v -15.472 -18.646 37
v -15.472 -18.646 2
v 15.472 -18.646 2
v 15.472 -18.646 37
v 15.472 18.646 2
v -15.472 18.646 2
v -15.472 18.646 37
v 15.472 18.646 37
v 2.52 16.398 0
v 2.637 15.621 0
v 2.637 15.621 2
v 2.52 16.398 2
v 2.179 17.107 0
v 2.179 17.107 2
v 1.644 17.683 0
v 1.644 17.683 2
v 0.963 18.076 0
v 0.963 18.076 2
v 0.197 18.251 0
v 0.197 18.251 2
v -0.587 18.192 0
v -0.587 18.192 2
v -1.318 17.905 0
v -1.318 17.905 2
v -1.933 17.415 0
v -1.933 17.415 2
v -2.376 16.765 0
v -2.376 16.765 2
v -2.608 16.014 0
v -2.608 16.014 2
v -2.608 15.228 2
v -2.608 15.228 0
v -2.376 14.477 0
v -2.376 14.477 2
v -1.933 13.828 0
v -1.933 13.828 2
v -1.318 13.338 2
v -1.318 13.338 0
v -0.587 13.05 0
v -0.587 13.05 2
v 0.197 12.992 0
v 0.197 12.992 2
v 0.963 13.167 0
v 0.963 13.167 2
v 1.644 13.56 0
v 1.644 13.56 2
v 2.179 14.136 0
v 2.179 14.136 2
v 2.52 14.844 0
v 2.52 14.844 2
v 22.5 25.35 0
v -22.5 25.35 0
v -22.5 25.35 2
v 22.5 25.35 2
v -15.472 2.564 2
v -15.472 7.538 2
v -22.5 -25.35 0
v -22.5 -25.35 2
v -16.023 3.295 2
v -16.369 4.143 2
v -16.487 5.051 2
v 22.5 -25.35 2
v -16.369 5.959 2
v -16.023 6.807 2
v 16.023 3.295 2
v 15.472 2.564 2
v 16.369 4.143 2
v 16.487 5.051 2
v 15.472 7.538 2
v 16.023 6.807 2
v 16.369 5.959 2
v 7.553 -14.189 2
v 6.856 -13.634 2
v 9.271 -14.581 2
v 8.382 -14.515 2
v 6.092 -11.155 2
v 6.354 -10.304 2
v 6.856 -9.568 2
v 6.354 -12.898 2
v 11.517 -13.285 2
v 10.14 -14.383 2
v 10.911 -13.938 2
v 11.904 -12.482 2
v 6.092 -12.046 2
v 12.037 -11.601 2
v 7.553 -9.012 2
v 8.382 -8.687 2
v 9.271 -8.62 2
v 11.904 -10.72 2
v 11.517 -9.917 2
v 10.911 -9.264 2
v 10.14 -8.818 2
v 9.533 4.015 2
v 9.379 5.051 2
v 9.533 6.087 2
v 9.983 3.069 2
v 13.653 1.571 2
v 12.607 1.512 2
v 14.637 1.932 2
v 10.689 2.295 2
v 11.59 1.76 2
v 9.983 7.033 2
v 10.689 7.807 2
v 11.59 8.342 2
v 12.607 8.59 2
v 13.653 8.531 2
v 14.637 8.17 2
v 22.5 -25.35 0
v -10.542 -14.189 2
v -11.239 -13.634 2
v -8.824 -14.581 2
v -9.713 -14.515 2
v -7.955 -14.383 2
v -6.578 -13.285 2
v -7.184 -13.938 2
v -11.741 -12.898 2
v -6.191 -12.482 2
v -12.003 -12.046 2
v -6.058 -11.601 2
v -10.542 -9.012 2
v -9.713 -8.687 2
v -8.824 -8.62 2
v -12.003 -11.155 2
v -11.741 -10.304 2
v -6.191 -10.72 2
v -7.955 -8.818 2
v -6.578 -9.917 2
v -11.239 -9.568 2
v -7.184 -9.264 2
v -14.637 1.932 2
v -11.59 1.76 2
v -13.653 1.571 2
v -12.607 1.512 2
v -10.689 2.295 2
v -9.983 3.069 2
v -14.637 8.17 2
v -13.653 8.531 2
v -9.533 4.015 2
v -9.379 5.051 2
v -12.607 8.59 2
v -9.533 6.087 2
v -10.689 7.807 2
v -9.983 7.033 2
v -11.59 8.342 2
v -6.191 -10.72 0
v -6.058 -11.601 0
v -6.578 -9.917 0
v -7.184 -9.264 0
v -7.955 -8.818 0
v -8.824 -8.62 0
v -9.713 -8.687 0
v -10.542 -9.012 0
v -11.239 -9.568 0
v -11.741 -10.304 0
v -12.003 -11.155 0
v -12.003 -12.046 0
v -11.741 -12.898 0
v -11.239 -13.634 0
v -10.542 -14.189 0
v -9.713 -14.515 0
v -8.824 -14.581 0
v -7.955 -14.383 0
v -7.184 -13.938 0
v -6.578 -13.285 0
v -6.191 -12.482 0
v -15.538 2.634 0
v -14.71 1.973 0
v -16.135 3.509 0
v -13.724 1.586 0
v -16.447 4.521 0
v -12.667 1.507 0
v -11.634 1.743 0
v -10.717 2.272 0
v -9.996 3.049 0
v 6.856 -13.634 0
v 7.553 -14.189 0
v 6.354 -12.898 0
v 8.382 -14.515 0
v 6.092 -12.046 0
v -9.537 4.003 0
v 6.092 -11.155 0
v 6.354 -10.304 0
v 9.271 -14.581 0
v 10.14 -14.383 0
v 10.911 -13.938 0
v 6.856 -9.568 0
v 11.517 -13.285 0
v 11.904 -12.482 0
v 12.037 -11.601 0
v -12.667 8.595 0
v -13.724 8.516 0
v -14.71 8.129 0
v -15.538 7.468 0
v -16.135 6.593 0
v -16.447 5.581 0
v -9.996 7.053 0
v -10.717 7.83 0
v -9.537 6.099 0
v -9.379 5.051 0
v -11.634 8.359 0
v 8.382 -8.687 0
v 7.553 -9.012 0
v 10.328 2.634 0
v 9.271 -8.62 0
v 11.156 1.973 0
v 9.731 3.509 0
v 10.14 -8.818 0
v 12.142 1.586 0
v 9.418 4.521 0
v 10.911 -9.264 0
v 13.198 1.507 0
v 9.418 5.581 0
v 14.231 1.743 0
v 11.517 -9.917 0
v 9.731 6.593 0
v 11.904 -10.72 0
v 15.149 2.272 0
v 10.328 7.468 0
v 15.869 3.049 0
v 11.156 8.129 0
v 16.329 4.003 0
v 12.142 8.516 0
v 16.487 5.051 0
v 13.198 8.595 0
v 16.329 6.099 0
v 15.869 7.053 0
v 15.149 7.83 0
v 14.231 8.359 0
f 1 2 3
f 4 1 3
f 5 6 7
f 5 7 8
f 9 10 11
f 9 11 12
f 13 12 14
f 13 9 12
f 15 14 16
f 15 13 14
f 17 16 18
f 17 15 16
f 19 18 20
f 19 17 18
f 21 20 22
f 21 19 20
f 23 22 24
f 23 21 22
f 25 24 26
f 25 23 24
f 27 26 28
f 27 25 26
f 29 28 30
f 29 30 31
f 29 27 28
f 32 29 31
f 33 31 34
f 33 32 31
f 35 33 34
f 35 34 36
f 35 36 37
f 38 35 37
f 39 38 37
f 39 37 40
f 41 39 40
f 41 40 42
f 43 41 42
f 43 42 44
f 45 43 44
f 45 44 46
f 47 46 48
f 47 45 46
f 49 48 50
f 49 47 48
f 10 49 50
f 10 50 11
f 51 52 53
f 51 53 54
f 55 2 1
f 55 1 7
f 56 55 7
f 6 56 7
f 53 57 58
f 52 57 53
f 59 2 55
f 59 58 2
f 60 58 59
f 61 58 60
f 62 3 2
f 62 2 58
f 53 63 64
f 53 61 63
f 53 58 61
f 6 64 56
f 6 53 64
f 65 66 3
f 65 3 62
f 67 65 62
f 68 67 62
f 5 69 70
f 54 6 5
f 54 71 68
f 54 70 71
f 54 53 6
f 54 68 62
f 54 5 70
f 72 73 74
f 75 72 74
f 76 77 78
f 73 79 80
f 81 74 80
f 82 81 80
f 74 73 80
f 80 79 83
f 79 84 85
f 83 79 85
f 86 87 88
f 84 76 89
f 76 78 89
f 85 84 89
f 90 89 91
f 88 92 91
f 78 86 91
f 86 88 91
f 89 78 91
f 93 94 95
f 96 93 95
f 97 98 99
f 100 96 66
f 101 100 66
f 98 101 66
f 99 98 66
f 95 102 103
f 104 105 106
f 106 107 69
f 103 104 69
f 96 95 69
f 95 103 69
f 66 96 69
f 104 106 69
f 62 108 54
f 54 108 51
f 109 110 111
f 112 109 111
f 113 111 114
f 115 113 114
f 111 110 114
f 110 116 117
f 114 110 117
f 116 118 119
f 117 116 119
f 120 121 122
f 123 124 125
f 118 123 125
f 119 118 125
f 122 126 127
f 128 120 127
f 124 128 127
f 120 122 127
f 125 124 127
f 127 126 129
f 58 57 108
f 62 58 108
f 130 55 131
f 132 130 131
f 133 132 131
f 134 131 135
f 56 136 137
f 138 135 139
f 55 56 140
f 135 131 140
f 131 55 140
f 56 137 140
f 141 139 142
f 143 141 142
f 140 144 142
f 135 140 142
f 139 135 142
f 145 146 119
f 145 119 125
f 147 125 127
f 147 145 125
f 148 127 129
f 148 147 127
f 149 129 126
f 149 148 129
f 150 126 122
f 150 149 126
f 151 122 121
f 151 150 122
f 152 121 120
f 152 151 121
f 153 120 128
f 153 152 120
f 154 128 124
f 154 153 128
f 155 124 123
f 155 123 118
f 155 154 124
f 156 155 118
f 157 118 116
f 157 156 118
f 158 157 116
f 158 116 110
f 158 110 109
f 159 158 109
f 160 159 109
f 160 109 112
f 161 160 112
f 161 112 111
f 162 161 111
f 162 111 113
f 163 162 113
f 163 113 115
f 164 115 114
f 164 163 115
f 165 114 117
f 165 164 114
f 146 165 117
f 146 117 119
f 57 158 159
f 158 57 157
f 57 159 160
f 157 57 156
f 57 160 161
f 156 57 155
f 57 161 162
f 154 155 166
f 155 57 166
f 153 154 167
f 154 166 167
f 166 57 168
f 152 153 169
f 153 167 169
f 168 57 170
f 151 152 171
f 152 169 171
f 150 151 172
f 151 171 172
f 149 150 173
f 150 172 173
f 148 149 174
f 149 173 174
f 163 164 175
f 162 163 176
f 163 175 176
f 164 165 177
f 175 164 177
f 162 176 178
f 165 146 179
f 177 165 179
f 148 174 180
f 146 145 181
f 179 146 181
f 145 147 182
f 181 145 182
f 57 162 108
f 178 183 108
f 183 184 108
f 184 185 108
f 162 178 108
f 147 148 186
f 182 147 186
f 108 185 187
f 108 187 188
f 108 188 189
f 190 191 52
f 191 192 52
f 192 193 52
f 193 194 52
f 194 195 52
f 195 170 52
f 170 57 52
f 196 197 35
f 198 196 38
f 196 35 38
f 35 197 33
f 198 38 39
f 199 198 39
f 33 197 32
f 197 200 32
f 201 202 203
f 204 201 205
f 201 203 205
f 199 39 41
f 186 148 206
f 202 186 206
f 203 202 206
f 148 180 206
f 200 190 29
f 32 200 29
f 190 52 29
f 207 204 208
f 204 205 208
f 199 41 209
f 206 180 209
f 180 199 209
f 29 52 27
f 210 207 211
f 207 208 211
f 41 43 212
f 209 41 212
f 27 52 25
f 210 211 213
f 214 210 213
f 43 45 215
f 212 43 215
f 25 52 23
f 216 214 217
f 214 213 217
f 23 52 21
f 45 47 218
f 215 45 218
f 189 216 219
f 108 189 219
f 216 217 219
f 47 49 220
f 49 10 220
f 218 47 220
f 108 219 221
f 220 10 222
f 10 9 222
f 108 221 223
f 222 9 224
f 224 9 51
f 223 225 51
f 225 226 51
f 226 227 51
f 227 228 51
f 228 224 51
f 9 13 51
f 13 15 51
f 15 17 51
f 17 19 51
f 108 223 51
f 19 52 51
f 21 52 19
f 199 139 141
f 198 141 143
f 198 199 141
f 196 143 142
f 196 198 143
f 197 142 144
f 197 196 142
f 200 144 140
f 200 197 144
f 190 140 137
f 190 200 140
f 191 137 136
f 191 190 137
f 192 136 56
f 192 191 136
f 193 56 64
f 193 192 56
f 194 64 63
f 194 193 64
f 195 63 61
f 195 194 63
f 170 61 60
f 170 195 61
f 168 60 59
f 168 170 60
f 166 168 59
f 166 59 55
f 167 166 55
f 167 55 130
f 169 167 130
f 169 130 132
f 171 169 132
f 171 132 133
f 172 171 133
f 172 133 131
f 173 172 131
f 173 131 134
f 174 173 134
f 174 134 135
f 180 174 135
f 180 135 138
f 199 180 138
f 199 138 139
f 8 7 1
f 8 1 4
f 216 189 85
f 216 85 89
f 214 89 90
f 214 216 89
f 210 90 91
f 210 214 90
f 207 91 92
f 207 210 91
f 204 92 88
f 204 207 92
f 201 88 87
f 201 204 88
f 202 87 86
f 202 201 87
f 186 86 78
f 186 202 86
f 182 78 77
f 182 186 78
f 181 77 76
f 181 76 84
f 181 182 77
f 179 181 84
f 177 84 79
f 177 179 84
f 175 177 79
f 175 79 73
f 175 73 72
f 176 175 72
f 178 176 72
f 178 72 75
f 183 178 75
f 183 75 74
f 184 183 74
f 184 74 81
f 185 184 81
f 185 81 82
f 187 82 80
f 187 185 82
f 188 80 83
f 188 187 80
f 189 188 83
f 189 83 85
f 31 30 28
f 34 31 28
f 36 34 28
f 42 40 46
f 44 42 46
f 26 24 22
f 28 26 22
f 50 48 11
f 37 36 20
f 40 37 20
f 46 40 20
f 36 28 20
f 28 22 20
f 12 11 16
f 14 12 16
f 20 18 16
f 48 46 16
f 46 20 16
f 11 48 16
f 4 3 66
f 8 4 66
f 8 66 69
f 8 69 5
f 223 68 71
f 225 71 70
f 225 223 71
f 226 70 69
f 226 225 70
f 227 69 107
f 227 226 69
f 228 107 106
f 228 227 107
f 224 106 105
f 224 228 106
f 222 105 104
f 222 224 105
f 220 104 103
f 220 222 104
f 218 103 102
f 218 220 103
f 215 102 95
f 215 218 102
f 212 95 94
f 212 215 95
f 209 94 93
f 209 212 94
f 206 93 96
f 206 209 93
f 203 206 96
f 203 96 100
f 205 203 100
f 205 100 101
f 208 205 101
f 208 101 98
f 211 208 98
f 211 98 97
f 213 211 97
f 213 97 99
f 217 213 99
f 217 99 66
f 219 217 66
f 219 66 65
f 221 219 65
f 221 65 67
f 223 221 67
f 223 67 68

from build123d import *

# Parameters (mm, degrees)
SKETCH1_W           = 45
SKETCH1_H           = 50.7
SKETCH1_R           = 2.636973336
SKETCH1_R_2         = 3.554118364
SKETCH1_R_3         = 2.989089767
BOSS_EXTRUDE1_DEPTH = 2
SKETCH2_W           = 30.94366189
SKETCH2_H           = 37.292040818
BOSS_EXTRUDE2_DEPTH = 35


with BuildPart() as part:
    # Sketch1 → Boss-Extrude1 (new body)
    with BuildSketch(Plane.XY):
        Rectangle(SKETCH1_W, SKETCH1_H)
        with Locations((0, 15.621214427)):
            Circle(SKETCH1_R, mode=Mode.SUBTRACT)
        with Locations((-12.932898819, 5.05104632)):
            Circle(SKETCH1_R_2, mode=Mode.SUBTRACT)
        with Locations((-9.047478573, -11.600754735)):
            Circle(SKETCH1_R_3, mode=Mode.SUBTRACT)
        with Locations((9.047478573, -11.600754735)):
            Circle(SKETCH1_R_3, mode=Mode.SUBTRACT)
        with Locations((12.932898819, 5.05104632)):
            Circle(SKETCH1_R_2, mode=Mode.SUBTRACT)
    extrude(amount=BOSS_EXTRUDE1_DEPTH)

    # Sketch2 → Boss-Extrude2 (add)
    with BuildSketch(Plane.XY.offset(2)):
        Rectangle(SKETCH2_W, SKETCH2_H)
    extrude(amount=BOSS_EXTRUDE2_DEPTH)


solid = part.part
